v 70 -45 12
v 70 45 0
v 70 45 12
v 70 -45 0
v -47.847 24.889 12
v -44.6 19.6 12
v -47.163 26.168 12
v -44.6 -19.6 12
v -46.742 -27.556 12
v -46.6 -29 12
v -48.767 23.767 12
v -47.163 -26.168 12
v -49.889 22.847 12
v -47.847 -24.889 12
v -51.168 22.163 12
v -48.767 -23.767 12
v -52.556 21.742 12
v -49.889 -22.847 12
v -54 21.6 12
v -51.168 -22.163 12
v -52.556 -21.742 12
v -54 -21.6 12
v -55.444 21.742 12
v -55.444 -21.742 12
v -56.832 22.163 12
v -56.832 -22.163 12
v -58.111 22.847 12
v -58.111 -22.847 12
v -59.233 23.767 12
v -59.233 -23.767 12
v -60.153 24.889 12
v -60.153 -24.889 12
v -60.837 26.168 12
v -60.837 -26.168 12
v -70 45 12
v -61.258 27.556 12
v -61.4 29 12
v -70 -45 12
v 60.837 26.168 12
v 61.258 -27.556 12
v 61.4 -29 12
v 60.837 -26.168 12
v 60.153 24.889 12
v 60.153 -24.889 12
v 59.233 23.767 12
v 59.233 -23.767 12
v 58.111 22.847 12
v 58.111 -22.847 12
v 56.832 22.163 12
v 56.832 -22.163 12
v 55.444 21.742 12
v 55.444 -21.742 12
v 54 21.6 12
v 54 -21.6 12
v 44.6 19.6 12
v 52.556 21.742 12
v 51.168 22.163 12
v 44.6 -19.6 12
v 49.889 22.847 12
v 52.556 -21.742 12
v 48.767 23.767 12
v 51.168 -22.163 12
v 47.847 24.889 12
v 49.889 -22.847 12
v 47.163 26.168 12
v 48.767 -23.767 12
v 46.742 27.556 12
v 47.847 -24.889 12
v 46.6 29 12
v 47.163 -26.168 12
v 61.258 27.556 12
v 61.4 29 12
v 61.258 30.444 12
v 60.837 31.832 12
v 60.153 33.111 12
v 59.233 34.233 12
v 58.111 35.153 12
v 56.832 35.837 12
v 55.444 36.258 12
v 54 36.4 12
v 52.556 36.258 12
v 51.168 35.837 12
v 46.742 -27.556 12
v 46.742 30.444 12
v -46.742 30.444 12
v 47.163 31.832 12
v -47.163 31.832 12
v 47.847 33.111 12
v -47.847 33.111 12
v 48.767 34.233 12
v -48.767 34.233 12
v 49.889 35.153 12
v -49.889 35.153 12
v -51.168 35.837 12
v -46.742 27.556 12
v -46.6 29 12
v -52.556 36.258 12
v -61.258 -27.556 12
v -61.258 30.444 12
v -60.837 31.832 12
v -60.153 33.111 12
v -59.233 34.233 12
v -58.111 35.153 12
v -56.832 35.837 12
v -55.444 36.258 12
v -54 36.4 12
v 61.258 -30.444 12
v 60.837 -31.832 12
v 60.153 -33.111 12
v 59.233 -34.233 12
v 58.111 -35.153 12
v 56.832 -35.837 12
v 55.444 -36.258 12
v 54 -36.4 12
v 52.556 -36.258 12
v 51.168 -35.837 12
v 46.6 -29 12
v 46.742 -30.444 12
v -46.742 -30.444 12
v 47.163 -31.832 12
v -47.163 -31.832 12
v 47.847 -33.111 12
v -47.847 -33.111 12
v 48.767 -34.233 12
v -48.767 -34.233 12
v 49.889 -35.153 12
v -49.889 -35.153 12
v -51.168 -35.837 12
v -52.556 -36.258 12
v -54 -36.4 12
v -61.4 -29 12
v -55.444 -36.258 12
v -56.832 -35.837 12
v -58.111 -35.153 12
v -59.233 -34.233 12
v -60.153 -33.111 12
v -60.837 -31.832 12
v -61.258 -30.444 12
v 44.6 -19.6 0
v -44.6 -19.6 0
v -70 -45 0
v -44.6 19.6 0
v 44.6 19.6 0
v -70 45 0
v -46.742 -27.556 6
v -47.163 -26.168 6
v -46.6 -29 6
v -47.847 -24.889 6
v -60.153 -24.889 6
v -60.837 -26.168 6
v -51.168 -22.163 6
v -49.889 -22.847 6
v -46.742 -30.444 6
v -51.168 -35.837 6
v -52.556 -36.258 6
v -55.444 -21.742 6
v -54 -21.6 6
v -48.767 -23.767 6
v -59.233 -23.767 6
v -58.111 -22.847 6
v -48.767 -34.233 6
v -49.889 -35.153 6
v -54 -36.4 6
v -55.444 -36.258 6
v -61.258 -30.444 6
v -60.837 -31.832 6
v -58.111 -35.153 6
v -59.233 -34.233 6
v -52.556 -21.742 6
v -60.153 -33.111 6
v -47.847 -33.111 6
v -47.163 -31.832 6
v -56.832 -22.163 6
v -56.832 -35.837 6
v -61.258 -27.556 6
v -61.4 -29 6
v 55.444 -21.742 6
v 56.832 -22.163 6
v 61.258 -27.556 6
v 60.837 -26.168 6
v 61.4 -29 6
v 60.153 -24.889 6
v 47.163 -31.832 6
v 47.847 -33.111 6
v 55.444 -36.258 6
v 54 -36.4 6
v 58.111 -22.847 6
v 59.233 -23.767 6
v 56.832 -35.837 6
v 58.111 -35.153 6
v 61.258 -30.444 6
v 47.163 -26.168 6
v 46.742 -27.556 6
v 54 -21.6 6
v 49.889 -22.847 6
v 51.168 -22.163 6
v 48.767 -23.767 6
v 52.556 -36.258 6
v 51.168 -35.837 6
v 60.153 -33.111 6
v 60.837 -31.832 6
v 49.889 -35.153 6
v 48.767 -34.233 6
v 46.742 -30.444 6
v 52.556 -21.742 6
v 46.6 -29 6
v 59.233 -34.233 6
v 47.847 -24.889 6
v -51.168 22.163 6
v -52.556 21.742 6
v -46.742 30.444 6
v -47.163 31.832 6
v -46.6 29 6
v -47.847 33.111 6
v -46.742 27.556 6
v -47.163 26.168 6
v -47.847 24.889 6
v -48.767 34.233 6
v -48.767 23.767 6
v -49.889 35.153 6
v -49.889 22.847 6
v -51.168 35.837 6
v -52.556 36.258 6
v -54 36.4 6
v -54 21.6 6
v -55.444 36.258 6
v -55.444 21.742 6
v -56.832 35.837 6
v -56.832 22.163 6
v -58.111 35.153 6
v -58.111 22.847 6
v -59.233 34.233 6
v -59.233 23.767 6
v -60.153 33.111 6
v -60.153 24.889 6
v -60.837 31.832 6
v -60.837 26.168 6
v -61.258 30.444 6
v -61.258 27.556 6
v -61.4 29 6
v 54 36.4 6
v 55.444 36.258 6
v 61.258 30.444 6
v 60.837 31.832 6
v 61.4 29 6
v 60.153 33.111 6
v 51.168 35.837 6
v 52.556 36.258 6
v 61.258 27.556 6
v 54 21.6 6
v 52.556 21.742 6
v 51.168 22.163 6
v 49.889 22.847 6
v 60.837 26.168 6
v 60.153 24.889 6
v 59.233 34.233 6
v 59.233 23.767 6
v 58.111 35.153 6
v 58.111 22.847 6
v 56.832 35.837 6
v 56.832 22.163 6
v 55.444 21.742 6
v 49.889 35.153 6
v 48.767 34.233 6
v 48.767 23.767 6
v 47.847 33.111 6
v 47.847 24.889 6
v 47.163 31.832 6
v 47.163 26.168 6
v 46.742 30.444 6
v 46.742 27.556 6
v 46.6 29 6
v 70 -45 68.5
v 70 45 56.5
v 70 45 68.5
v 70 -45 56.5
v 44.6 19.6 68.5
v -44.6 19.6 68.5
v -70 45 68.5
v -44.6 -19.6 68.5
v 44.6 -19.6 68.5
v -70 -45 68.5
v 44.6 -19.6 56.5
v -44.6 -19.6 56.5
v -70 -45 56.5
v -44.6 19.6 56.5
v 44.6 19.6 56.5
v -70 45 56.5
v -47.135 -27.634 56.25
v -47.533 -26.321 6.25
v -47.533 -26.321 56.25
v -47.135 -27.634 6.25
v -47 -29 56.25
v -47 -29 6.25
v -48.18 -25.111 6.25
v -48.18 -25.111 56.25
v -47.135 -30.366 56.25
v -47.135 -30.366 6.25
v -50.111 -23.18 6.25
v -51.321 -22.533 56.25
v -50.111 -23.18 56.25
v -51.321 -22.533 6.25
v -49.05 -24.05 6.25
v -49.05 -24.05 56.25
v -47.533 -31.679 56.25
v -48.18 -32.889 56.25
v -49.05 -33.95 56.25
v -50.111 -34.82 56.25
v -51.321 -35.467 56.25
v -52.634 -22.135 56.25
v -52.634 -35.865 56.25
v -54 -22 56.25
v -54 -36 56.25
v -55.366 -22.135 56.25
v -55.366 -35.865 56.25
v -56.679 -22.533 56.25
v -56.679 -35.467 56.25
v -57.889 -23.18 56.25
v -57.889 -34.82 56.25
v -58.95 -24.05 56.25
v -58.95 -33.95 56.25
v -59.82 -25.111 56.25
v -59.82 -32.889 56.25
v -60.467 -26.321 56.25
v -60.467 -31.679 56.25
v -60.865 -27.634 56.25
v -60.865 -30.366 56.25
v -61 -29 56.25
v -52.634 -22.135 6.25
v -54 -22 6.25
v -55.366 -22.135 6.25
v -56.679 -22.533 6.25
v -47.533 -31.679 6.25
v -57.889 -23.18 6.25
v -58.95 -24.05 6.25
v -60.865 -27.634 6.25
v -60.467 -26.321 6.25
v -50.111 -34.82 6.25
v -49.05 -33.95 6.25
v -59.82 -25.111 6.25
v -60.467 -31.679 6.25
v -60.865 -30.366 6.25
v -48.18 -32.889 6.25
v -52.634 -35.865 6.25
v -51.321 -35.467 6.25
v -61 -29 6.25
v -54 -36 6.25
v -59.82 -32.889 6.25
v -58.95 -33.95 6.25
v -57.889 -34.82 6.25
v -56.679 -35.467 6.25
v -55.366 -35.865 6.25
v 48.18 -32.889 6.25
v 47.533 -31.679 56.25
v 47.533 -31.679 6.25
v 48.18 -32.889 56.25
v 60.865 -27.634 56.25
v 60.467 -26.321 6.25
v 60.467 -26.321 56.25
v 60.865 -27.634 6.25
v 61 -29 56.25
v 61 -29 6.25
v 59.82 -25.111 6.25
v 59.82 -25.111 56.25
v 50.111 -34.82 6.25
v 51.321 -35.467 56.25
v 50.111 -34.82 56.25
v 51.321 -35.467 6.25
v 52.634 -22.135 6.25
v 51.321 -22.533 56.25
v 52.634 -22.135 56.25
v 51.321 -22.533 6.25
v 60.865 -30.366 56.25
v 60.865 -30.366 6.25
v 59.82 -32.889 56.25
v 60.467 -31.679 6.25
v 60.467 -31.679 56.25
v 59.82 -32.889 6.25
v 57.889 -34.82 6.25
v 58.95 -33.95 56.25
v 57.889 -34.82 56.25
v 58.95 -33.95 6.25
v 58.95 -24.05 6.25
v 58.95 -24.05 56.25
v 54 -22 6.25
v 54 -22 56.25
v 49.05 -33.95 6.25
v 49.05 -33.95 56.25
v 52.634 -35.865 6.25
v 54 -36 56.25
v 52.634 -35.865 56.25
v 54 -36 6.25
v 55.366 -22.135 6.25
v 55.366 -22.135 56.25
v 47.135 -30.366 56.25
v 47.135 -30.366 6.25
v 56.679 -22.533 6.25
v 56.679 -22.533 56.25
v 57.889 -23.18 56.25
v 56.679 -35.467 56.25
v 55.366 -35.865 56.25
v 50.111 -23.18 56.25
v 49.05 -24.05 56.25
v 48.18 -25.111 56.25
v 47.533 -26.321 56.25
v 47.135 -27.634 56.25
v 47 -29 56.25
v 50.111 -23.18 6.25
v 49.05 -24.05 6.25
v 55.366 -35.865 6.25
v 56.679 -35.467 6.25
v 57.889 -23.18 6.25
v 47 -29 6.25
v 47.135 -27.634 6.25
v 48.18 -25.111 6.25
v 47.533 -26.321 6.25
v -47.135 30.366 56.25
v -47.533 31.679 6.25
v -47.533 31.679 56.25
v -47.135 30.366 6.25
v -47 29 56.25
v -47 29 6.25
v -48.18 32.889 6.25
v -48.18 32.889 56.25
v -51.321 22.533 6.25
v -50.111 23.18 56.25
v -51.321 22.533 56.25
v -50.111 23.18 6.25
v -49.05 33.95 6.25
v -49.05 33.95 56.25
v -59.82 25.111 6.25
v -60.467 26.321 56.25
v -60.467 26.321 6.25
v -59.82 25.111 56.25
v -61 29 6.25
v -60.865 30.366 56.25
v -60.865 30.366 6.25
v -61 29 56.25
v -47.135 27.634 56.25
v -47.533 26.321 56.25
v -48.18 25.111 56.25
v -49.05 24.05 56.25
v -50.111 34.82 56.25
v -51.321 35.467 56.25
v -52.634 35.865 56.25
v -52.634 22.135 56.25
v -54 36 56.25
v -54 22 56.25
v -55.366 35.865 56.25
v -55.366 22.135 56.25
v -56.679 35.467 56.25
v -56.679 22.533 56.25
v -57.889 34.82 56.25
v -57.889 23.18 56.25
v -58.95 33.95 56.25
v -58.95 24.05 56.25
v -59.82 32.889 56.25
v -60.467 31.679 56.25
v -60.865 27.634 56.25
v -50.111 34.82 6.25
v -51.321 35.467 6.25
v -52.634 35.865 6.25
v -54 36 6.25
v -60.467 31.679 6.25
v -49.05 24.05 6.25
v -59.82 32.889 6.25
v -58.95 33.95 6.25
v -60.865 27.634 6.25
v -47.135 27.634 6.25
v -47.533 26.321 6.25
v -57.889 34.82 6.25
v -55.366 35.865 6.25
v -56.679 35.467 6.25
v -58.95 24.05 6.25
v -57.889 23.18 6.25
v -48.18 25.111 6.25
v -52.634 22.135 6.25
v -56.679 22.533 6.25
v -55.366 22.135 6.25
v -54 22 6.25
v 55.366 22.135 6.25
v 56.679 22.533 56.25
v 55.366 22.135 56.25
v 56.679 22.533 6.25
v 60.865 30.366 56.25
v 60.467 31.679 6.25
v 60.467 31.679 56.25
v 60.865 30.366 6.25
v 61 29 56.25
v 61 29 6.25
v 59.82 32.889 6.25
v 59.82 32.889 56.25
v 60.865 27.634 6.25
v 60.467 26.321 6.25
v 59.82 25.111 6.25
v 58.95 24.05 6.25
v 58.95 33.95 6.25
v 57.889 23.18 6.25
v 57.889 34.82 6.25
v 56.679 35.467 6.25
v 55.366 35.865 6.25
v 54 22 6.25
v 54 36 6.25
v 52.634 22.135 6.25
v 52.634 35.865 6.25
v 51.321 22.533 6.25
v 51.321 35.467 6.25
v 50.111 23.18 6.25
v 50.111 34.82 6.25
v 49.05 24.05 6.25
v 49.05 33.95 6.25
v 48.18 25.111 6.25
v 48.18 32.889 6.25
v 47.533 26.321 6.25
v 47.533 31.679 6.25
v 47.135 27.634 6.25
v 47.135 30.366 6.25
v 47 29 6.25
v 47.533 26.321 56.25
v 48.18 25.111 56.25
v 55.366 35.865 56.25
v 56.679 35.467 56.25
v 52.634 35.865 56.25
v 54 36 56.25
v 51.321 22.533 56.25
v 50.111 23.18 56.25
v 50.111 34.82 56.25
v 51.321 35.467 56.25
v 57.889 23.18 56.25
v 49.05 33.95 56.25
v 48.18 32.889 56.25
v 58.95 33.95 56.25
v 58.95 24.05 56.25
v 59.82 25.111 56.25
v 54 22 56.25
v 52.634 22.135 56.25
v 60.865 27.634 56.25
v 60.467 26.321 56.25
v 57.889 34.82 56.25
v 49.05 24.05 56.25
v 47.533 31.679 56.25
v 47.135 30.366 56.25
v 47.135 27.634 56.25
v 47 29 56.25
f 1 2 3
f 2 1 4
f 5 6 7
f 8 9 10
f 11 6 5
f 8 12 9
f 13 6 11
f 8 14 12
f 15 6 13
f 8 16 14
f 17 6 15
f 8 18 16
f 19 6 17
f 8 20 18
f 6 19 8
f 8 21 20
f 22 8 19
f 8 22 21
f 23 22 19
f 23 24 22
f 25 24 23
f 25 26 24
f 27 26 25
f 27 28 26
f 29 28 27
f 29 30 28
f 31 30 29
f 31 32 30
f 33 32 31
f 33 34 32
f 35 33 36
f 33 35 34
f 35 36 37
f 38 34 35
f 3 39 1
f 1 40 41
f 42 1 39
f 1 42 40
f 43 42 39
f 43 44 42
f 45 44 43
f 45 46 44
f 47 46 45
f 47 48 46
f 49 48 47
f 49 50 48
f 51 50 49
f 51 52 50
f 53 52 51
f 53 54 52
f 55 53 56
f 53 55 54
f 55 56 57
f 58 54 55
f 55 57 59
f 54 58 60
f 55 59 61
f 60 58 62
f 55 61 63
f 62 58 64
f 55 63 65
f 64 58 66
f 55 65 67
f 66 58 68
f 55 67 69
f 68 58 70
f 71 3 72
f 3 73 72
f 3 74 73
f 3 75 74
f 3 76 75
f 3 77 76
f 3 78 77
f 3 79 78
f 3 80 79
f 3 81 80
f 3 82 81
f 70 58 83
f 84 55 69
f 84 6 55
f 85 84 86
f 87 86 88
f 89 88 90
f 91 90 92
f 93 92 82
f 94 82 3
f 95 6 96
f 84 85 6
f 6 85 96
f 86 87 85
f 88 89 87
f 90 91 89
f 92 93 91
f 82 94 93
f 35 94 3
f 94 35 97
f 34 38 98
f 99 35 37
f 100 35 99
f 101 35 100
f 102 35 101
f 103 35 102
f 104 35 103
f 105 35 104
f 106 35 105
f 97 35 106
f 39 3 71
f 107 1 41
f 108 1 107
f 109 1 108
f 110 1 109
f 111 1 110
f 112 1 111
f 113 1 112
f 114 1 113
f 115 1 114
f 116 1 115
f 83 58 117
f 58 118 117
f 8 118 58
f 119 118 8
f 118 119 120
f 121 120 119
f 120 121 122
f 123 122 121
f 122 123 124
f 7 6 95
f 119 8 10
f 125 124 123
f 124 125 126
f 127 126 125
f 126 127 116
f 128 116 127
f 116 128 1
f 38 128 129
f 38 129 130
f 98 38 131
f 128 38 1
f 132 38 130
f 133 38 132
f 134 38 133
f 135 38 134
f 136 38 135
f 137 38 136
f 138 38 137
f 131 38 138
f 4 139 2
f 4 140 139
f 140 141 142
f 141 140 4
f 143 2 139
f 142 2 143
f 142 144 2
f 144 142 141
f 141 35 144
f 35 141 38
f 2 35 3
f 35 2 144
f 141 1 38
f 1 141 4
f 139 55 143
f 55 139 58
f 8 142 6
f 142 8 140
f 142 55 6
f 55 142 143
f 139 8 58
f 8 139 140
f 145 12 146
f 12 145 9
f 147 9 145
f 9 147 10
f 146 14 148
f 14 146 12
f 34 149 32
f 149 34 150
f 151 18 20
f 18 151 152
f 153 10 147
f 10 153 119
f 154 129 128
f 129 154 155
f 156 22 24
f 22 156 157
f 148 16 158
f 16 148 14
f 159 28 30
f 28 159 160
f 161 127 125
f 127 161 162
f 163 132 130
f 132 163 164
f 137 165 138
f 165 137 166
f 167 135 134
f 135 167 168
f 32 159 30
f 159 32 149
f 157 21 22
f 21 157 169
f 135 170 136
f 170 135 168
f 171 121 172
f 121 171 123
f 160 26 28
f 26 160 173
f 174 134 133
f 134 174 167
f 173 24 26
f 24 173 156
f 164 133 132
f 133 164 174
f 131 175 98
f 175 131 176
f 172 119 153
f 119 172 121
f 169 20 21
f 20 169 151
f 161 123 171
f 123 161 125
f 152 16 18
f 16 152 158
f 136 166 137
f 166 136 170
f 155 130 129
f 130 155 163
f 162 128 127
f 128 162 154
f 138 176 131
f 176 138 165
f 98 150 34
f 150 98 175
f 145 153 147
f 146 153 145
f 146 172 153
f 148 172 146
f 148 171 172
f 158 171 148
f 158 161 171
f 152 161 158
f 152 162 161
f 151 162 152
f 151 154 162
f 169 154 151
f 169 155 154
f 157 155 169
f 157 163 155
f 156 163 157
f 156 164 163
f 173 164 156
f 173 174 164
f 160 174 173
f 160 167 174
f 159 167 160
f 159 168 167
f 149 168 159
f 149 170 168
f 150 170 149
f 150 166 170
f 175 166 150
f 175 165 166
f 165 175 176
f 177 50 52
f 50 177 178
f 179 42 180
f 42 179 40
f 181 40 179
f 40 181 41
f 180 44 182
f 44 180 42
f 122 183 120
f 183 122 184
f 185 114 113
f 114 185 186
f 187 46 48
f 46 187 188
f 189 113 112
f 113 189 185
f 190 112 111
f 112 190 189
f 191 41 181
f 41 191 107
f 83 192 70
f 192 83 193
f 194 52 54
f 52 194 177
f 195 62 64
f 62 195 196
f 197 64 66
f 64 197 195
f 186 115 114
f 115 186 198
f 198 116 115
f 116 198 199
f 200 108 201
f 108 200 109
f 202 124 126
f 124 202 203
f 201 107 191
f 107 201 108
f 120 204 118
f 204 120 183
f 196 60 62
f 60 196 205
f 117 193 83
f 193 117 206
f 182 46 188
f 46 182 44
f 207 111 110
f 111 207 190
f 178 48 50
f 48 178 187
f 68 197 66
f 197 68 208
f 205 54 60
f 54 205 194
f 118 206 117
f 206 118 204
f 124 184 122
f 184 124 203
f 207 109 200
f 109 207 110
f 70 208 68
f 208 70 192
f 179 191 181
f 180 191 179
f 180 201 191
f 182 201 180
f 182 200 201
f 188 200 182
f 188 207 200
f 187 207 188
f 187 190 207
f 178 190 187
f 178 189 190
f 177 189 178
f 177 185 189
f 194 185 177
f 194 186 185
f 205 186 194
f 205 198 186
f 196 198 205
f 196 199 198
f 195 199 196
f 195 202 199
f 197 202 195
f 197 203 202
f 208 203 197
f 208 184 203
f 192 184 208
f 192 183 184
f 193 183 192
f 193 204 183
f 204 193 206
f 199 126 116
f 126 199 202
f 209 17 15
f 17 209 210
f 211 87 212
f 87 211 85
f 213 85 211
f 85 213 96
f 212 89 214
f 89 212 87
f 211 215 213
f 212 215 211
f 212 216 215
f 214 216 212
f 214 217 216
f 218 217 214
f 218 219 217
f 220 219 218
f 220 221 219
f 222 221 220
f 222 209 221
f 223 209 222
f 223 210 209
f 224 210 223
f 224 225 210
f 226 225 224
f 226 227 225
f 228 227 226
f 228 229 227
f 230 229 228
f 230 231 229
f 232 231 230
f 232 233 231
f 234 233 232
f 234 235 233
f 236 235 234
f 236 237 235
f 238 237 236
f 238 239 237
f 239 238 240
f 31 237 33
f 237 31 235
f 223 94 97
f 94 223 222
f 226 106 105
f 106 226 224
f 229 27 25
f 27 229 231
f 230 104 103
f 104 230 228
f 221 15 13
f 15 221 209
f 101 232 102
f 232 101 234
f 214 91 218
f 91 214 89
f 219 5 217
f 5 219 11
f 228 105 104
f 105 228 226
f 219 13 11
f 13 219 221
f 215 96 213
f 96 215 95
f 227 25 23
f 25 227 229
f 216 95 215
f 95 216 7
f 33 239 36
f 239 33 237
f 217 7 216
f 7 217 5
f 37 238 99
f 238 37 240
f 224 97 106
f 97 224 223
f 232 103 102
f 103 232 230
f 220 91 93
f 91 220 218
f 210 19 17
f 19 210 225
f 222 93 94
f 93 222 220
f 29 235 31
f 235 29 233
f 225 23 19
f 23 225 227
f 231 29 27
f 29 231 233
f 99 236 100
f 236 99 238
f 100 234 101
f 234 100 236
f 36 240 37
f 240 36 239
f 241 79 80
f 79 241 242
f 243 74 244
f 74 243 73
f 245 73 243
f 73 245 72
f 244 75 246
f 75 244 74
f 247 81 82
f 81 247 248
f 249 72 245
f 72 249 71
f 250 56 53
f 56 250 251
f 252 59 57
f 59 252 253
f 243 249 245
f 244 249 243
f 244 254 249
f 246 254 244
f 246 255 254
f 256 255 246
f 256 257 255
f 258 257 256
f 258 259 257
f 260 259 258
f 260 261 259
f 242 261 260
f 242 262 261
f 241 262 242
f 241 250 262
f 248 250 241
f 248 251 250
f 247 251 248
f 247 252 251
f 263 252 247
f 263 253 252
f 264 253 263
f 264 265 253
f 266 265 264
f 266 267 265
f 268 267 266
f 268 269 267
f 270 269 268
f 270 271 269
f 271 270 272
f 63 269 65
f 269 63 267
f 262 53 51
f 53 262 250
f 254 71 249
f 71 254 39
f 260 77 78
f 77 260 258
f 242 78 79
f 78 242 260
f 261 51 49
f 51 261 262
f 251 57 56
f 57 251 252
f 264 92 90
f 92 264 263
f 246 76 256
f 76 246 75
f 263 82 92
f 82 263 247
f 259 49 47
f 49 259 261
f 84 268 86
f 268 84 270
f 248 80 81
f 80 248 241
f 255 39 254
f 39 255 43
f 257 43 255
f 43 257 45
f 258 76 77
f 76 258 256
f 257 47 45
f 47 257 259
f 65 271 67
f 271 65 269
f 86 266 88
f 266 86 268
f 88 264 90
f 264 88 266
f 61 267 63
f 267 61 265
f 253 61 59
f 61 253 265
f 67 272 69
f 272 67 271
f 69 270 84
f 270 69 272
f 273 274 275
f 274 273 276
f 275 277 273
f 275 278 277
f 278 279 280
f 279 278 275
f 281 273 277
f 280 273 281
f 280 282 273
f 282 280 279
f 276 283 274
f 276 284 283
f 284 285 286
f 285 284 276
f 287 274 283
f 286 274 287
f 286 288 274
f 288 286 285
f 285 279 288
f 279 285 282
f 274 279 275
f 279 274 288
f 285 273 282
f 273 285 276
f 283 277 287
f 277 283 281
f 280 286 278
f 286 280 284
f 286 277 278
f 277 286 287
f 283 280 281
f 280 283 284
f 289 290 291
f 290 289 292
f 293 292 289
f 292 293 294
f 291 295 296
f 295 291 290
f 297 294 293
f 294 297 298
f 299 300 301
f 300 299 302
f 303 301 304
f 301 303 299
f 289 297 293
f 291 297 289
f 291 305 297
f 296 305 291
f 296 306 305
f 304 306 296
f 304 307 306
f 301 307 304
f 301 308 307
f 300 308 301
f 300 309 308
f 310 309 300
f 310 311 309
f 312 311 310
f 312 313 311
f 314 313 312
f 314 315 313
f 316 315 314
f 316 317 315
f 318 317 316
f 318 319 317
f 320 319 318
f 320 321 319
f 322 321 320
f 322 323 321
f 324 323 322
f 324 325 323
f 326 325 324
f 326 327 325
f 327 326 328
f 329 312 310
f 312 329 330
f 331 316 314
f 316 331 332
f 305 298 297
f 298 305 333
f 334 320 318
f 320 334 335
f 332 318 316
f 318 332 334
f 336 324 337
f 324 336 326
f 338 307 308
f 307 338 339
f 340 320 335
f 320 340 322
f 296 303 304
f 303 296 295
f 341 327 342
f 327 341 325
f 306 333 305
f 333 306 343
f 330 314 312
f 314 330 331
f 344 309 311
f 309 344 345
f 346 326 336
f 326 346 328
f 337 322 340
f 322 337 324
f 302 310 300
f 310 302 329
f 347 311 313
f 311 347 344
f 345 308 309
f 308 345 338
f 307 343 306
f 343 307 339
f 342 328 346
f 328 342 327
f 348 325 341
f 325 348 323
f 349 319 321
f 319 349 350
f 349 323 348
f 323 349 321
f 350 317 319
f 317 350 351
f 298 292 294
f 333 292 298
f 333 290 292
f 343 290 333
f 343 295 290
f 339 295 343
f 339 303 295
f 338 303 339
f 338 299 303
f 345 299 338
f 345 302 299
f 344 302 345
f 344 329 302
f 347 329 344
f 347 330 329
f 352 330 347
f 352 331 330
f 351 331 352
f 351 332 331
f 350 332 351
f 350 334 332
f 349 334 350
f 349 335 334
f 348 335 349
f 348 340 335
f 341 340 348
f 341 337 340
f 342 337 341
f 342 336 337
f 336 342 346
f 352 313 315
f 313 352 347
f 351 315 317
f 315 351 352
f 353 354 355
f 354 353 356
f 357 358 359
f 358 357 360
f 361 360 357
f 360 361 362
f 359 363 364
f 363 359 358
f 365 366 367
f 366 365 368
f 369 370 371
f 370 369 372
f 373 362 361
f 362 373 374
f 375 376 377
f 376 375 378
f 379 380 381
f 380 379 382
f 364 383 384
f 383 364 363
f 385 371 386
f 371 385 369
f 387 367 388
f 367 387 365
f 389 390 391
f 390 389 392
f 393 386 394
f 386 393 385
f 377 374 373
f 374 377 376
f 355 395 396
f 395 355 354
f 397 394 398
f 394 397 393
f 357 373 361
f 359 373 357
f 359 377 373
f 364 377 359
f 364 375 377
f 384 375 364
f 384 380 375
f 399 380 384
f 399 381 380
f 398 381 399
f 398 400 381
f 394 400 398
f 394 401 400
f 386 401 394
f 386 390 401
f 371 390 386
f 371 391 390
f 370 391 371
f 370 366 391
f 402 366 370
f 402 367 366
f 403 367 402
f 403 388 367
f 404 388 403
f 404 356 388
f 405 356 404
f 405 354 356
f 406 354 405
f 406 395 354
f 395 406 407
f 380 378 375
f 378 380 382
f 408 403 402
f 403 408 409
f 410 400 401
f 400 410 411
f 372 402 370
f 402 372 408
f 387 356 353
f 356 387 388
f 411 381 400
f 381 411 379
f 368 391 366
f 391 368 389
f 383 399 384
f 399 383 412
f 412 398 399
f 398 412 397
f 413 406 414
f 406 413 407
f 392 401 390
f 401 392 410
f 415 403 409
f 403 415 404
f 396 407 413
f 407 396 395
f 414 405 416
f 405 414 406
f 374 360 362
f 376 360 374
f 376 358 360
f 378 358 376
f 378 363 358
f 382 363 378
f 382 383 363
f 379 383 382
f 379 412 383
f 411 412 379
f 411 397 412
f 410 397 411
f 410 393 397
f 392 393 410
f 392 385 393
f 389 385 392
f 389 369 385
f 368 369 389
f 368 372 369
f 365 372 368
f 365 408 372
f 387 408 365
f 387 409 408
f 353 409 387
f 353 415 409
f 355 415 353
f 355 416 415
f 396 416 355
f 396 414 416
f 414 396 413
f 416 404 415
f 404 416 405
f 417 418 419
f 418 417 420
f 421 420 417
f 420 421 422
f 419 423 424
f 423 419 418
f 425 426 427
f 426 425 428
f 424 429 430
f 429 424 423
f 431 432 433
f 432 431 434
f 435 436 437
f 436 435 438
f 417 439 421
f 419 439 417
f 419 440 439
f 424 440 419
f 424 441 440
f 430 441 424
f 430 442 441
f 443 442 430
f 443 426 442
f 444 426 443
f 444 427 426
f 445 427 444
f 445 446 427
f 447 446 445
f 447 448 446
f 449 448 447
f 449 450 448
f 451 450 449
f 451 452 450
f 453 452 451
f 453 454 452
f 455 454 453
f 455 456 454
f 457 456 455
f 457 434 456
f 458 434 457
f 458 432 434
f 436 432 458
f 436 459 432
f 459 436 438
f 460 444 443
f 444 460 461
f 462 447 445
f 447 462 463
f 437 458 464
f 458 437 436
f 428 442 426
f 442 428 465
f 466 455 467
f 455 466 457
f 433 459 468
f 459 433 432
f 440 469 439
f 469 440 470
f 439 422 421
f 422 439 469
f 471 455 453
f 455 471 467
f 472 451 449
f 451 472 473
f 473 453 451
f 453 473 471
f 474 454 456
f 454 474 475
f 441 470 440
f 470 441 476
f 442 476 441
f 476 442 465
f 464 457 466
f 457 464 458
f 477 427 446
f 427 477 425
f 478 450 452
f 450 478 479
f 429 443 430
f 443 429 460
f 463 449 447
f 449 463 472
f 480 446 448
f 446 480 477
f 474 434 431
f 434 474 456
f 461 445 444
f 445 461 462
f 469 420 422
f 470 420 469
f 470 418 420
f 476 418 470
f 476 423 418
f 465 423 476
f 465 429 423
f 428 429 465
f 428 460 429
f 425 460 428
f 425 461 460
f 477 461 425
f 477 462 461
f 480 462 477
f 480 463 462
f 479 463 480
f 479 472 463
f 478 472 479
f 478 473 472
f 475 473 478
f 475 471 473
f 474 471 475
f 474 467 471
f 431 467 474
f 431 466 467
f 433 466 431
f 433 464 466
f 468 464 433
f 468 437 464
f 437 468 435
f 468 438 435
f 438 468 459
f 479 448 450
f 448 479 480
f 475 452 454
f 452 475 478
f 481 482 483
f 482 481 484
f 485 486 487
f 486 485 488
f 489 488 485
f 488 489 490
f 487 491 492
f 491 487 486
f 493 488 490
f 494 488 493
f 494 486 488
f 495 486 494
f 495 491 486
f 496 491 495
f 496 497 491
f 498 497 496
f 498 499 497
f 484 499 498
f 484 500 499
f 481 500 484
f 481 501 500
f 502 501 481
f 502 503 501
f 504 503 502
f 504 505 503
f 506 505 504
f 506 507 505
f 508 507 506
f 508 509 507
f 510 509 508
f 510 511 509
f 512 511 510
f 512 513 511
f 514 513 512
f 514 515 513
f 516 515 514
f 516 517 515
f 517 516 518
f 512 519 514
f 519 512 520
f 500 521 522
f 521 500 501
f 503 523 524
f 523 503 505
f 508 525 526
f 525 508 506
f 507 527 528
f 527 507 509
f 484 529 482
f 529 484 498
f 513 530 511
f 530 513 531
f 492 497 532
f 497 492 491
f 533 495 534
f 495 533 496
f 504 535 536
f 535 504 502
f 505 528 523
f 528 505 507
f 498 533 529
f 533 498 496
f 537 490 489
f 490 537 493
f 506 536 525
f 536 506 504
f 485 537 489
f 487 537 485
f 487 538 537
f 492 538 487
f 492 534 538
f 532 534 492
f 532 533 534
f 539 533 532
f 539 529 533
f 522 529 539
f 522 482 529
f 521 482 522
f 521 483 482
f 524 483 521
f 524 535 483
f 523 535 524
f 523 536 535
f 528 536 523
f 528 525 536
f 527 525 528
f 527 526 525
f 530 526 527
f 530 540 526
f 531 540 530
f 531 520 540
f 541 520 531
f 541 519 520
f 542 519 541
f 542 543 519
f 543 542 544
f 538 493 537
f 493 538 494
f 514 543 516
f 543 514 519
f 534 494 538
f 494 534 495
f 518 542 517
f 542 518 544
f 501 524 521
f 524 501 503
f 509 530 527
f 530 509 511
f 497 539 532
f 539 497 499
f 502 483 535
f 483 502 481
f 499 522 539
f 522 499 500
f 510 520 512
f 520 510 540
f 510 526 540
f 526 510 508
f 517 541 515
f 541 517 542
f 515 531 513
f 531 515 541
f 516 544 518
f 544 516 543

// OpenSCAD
$fn = 32;

// ------------------------------------------------------------------------
// Frame cube: base 140 x 90 mm, posts 50 mm tall
// Every part is its own module, assembly() places every instance.
// ------------------------------------------------------------------------

// --- part 1 ---
module base_frame() {
  difference() {
    translate([-70, -45, 0]) cube([140, 90, 12]);
    translate([-44.6, -19.6, -1]) cube([89.2, 39.2, 14]);
    translate([-54, -29, 6]) cylinder(h = 7, d = 14.8);
    translate([54, -29, 6]) cylinder(h = 7, d = 14.8);
    translate([-54, 29, 6]) cylinder(h = 7, d = 14.8);
    translate([54, 29, 6]) cylinder(h = 7, d = 14.8);
  }
}

// --- part 2 ---
module corner_post() {
  cylinder(h = 50, d = 14);
}

// --- part 3 ---
module top_frame() {
  difference() {
    translate([-70, -45, 0]) cube([140, 90, 12]);
    translate([-44.6, -19.6, -1]) cube([89.2, 39.2, 14]);
  }
}

// --- assembly ---
module assembly() {
  color([0.80, 0.24, 0.20]) translate([0, 0, 0]) rotate([0, 0, 0]) base_frame();
  color([0.20, 0.45, 0.75]) translate([-54, -29, 6.25]) rotate([0, 0, 0]) corner_post();
  color([0.25, 0.62, 0.32]) translate([54, -29, 6.25]) rotate([0, 0, 0]) corner_post();
  color([0.92, 0.70, 0.18]) translate([-54, 29, 6.25]) rotate([0, 0, 0]) corner_post();
  color([0.58, 0.35, 0.70]) translate([54, 29, 6.25]) rotate([0, 0, 0]) corner_post();
  color([0.16, 0.66, 0.66]) translate([0, 0, 56.5]) rotate([0, 0, 0]) top_frame();
}

assembly();
